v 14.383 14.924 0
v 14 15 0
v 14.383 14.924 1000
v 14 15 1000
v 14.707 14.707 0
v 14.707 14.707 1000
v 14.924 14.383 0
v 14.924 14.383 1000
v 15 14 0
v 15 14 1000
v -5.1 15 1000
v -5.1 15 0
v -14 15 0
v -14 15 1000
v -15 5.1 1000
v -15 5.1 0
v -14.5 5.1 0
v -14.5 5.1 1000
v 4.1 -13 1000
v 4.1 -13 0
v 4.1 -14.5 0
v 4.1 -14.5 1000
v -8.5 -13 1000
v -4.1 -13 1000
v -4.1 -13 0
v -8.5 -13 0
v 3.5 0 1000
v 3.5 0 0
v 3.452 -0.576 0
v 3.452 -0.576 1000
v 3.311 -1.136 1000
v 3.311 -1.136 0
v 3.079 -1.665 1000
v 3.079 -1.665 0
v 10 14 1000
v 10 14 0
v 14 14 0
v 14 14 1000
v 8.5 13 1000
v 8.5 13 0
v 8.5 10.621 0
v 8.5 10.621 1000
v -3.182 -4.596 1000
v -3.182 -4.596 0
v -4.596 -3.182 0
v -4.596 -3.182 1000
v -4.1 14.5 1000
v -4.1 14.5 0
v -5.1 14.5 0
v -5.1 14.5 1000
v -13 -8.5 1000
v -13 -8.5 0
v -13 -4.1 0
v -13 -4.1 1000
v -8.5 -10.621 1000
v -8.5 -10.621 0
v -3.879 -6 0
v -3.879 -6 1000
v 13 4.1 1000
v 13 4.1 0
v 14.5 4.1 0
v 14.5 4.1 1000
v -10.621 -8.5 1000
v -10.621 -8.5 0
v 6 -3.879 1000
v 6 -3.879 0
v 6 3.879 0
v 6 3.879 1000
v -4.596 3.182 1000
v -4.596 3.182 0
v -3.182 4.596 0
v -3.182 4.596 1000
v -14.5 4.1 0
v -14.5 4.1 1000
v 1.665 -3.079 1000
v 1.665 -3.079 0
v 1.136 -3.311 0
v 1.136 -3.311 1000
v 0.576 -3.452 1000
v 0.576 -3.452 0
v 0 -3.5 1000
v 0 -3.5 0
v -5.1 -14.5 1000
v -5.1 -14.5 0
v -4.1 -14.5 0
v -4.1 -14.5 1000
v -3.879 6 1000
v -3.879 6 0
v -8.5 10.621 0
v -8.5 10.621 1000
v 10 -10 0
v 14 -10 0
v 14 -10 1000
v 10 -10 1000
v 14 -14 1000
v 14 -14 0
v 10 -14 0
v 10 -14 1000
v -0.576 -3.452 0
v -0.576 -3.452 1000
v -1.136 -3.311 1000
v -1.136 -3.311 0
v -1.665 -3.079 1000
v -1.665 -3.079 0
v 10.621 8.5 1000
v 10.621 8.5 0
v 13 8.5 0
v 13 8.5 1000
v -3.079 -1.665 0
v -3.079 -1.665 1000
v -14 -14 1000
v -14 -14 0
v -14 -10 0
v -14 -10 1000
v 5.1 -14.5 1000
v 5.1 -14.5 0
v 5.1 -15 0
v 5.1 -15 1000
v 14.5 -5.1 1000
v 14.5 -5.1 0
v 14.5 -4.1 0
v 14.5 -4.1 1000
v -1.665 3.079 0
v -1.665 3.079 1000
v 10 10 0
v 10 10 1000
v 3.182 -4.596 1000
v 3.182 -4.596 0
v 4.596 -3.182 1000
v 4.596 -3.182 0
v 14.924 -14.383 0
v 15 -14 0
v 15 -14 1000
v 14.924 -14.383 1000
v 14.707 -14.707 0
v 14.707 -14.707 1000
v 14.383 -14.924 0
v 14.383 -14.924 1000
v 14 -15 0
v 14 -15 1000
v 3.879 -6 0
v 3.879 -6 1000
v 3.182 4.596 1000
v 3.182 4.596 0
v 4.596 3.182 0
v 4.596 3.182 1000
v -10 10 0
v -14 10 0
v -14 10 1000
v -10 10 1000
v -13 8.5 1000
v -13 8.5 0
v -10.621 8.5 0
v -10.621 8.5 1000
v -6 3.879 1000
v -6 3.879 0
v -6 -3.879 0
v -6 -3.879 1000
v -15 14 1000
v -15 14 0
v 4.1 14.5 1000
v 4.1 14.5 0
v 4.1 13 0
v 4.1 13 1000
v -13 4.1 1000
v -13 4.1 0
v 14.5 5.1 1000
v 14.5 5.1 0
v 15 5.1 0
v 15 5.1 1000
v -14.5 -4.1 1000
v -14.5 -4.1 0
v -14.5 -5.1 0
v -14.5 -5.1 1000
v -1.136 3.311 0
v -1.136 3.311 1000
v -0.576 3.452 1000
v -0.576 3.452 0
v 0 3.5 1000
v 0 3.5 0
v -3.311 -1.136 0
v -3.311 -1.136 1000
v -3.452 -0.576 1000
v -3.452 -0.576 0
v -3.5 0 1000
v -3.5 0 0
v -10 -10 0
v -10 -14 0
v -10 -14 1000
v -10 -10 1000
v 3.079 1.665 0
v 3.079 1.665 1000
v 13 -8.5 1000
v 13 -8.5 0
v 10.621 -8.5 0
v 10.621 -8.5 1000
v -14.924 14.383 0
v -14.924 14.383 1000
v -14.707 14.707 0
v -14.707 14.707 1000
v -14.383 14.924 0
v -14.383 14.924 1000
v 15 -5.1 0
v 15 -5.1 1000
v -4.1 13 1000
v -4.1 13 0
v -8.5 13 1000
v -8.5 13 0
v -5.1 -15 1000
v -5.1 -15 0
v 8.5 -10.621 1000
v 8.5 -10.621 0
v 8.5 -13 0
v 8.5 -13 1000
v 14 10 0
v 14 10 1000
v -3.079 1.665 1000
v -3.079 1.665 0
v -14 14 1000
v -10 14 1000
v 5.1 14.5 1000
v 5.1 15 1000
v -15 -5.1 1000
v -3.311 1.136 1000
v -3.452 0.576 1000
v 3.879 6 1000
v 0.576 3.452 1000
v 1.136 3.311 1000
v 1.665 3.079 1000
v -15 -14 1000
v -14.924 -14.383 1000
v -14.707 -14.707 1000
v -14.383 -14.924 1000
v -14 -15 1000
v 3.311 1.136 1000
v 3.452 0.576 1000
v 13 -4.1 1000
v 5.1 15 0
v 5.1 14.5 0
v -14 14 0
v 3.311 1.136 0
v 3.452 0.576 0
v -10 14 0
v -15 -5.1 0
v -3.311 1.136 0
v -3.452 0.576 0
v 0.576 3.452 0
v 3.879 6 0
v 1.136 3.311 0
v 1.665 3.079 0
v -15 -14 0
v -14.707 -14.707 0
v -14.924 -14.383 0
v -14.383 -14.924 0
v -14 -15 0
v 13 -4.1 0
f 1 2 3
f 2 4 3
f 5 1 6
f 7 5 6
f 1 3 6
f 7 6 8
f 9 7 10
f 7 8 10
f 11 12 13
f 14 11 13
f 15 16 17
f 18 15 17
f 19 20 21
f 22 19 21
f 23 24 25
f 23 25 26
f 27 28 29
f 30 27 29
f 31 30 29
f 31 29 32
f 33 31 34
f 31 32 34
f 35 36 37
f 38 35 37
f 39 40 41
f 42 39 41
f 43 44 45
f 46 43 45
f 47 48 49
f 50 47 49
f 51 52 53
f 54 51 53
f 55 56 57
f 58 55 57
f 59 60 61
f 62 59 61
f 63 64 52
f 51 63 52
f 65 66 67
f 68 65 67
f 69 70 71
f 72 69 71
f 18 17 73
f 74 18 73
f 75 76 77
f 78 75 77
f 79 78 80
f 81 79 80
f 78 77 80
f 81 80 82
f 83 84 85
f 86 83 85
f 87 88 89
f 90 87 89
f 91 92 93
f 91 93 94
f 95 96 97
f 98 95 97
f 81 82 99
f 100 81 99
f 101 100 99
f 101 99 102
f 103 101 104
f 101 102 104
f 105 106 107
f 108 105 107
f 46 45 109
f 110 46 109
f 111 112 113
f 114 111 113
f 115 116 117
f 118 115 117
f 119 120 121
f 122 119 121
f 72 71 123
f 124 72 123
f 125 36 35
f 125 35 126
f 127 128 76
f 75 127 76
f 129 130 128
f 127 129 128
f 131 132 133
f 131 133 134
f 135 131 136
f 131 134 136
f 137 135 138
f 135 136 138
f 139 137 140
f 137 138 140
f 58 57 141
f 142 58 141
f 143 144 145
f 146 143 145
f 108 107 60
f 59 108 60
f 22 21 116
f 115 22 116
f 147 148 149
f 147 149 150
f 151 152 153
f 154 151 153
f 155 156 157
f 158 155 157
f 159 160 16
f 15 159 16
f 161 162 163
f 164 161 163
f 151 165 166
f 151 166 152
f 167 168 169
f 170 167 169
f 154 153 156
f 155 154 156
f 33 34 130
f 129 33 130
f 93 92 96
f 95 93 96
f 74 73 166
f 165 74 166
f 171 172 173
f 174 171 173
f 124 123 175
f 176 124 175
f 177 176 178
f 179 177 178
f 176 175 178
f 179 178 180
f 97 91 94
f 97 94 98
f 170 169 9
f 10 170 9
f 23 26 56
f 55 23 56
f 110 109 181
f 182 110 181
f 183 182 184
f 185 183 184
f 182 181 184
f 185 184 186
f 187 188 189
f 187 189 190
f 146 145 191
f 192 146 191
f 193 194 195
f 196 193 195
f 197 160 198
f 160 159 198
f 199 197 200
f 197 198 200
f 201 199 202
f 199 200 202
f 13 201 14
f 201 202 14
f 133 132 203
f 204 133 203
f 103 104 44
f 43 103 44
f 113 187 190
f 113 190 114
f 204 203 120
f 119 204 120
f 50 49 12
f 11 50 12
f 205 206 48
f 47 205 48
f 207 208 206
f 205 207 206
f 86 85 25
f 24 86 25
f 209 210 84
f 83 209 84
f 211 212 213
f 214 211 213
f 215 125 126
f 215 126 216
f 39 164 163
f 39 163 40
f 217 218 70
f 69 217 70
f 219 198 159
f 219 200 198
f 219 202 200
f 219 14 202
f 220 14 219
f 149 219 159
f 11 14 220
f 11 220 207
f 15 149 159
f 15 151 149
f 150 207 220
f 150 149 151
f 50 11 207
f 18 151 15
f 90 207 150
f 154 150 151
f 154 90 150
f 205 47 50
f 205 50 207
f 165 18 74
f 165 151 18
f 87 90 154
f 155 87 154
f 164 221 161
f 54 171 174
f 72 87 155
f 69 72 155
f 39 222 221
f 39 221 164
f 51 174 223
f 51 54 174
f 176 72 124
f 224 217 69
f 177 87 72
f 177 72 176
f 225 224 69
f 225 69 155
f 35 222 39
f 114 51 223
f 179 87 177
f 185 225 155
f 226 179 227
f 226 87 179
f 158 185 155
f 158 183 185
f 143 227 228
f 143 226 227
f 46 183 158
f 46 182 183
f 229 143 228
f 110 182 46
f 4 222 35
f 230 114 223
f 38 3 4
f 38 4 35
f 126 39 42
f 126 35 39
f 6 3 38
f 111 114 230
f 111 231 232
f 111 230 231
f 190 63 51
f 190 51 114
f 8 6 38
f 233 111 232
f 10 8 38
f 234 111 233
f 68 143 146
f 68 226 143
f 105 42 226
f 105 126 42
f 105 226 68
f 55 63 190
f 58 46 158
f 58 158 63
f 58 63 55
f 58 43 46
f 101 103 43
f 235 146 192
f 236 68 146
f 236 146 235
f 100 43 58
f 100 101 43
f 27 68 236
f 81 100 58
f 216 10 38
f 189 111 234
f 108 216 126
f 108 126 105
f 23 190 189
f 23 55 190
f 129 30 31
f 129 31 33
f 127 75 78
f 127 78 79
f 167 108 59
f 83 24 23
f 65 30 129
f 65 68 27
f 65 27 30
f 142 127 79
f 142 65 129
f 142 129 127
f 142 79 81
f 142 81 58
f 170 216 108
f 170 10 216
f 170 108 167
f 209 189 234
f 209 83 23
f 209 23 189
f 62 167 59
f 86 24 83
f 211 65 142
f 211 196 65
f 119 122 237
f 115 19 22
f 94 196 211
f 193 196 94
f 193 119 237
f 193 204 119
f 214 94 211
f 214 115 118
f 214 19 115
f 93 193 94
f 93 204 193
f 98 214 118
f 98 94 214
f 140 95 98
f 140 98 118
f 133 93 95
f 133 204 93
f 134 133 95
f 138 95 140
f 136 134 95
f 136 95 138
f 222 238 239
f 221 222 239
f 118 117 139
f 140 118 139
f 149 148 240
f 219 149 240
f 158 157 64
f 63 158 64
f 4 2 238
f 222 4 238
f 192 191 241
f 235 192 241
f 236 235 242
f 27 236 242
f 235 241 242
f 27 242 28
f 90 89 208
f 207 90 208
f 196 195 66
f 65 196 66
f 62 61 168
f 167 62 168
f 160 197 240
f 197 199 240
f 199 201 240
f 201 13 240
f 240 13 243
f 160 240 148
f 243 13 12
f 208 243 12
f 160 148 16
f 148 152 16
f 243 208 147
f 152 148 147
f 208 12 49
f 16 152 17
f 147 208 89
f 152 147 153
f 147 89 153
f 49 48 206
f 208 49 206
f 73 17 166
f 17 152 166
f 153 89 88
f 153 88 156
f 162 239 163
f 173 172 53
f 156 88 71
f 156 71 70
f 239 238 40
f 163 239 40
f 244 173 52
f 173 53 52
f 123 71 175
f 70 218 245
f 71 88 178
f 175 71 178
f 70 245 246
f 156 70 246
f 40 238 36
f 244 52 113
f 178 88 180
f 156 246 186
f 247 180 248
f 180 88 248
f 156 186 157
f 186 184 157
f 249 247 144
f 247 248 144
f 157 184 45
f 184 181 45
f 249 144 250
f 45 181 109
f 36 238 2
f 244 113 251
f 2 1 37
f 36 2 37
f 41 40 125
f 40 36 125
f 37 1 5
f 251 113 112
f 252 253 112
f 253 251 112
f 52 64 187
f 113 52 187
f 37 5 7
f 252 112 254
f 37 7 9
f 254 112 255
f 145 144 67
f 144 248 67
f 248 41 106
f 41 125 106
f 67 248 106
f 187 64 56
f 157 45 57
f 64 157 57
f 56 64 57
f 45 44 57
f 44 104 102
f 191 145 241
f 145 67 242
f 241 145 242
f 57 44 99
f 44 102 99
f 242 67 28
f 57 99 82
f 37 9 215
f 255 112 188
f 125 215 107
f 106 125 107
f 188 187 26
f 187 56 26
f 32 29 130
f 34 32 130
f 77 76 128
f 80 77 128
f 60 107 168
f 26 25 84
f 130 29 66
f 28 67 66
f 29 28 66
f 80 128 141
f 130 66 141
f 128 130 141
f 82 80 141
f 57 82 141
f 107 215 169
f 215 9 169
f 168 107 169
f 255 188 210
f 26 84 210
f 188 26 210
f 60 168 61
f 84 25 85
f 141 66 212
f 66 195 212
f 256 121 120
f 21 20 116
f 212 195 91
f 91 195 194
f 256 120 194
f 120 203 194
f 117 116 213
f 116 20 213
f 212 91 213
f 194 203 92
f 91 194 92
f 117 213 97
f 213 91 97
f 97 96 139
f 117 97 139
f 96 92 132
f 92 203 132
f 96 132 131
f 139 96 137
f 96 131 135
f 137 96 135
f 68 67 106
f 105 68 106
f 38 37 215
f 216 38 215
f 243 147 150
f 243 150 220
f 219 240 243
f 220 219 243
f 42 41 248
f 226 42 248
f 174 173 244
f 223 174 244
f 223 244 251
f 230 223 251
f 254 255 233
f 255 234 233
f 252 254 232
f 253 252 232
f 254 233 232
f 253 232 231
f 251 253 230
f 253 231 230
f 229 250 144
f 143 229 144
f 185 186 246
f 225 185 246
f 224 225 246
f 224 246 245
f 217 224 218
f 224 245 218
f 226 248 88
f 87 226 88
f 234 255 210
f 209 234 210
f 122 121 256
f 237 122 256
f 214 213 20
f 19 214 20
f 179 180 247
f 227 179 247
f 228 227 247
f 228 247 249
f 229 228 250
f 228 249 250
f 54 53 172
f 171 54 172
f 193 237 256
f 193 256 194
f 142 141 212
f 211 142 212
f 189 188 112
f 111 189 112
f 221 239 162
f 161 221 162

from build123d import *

# Parameters (mm, degrees)
ESBO_O1_W                = 4
ESBO_O1_H                = 4
RESSALTO_EXTRUS_O1_DEPTH = 1000
PADR_OCIRCULAR1_COUNT    = 4
FILETE1_R                = 1


with BuildPart() as part:
    # Esboço1 → Ressalto-extrusão1 (new body)
    with BuildSketch(Plane.XY):
        with BuildLine():
            ThreePointArc((-1.664601464, 3.078815026), (-0.858529967, 3.393070335), (0, 3.5))
            Line((0, 3.5), (0, 6))
            Line((0, 6), (-3.878679656, 6))
            Line((-3.878679656, 6), (-8.5, 10.621320344))
            Line((-8.5, 10.621320344), (-8.5, 13))
            Line((-8.5, 13), (-4.1, 13))
            Line((-4.1, 13), (-4.1, 14.5))
            Line((-4.1, 14.5), (-5.1, 14.5))
            Line((-5.1, 14.5), (-5.1, 15))
            Line((-5.1, 15), (-15, 15))
            Line((-15, 15), (-15, 5.1))
            Line((-15, 5.1), (-14.5, 5.1))
            Line((-14.5, 5.1), (-14.5, 4.1))
            Line((-14.5, 4.1), (-13, 4.1))
            Line((-13, 4.1), (-13, 8.5))
            Line((-13, 8.5), (-10.621320344, 8.5))
            Line((-10.621320344, 8.5), (-6, 3.878679656))
            Line((-6, 3.878679656), (-6, 0))
            Line((-6, 0), (-3.5, 0))
            ThreePointArc((-3.5, 0), (-3.393070335, 0.858529967), (-3.078815026, 1.664601464))
            Line((-3.078815026, 1.664601464), (-4.596194078, 3.181980515))
            Line((-4.596194078, 3.181980515), (-3.181980515, 4.596194078))
            Line((-3.181980515, 4.596194078), (-1.664601464, 3.078815026))
        make_face()
        with Locations((-12, 12)):
            Rectangle(ESBO_O1_W, ESBO_O1_H, mode=Mode.SUBTRACT)
    ressalto_extrus_o1 = extrude(amount=RESSALTO_EXTRUS_O1_DEPTH)

    # PadrãoCircular1: Ressalto-extrusão1 ×4 about axis
    padr_ocircular1_axis = Axis((0, 0, 0), (0, 0, 1))
    for i in range(1, PADR_OCIRCULAR1_COUNT):
        add(ressalto_extrus_o1.rotate(padr_ocircular1_axis, i * 360 / PADR_OCIRCULAR1_COUNT))

    # Filete1
    filete1_edges = [part.edges().sort_by_distance(p)[0] for p in [
        (15, -15, 500),
        (15, 15, 500),
        (-15, 15, 500),
        (-15, -15, 500),
    ]]
    fillet(filete1_edges, radius=FILETE1_R)


solid = part.part
